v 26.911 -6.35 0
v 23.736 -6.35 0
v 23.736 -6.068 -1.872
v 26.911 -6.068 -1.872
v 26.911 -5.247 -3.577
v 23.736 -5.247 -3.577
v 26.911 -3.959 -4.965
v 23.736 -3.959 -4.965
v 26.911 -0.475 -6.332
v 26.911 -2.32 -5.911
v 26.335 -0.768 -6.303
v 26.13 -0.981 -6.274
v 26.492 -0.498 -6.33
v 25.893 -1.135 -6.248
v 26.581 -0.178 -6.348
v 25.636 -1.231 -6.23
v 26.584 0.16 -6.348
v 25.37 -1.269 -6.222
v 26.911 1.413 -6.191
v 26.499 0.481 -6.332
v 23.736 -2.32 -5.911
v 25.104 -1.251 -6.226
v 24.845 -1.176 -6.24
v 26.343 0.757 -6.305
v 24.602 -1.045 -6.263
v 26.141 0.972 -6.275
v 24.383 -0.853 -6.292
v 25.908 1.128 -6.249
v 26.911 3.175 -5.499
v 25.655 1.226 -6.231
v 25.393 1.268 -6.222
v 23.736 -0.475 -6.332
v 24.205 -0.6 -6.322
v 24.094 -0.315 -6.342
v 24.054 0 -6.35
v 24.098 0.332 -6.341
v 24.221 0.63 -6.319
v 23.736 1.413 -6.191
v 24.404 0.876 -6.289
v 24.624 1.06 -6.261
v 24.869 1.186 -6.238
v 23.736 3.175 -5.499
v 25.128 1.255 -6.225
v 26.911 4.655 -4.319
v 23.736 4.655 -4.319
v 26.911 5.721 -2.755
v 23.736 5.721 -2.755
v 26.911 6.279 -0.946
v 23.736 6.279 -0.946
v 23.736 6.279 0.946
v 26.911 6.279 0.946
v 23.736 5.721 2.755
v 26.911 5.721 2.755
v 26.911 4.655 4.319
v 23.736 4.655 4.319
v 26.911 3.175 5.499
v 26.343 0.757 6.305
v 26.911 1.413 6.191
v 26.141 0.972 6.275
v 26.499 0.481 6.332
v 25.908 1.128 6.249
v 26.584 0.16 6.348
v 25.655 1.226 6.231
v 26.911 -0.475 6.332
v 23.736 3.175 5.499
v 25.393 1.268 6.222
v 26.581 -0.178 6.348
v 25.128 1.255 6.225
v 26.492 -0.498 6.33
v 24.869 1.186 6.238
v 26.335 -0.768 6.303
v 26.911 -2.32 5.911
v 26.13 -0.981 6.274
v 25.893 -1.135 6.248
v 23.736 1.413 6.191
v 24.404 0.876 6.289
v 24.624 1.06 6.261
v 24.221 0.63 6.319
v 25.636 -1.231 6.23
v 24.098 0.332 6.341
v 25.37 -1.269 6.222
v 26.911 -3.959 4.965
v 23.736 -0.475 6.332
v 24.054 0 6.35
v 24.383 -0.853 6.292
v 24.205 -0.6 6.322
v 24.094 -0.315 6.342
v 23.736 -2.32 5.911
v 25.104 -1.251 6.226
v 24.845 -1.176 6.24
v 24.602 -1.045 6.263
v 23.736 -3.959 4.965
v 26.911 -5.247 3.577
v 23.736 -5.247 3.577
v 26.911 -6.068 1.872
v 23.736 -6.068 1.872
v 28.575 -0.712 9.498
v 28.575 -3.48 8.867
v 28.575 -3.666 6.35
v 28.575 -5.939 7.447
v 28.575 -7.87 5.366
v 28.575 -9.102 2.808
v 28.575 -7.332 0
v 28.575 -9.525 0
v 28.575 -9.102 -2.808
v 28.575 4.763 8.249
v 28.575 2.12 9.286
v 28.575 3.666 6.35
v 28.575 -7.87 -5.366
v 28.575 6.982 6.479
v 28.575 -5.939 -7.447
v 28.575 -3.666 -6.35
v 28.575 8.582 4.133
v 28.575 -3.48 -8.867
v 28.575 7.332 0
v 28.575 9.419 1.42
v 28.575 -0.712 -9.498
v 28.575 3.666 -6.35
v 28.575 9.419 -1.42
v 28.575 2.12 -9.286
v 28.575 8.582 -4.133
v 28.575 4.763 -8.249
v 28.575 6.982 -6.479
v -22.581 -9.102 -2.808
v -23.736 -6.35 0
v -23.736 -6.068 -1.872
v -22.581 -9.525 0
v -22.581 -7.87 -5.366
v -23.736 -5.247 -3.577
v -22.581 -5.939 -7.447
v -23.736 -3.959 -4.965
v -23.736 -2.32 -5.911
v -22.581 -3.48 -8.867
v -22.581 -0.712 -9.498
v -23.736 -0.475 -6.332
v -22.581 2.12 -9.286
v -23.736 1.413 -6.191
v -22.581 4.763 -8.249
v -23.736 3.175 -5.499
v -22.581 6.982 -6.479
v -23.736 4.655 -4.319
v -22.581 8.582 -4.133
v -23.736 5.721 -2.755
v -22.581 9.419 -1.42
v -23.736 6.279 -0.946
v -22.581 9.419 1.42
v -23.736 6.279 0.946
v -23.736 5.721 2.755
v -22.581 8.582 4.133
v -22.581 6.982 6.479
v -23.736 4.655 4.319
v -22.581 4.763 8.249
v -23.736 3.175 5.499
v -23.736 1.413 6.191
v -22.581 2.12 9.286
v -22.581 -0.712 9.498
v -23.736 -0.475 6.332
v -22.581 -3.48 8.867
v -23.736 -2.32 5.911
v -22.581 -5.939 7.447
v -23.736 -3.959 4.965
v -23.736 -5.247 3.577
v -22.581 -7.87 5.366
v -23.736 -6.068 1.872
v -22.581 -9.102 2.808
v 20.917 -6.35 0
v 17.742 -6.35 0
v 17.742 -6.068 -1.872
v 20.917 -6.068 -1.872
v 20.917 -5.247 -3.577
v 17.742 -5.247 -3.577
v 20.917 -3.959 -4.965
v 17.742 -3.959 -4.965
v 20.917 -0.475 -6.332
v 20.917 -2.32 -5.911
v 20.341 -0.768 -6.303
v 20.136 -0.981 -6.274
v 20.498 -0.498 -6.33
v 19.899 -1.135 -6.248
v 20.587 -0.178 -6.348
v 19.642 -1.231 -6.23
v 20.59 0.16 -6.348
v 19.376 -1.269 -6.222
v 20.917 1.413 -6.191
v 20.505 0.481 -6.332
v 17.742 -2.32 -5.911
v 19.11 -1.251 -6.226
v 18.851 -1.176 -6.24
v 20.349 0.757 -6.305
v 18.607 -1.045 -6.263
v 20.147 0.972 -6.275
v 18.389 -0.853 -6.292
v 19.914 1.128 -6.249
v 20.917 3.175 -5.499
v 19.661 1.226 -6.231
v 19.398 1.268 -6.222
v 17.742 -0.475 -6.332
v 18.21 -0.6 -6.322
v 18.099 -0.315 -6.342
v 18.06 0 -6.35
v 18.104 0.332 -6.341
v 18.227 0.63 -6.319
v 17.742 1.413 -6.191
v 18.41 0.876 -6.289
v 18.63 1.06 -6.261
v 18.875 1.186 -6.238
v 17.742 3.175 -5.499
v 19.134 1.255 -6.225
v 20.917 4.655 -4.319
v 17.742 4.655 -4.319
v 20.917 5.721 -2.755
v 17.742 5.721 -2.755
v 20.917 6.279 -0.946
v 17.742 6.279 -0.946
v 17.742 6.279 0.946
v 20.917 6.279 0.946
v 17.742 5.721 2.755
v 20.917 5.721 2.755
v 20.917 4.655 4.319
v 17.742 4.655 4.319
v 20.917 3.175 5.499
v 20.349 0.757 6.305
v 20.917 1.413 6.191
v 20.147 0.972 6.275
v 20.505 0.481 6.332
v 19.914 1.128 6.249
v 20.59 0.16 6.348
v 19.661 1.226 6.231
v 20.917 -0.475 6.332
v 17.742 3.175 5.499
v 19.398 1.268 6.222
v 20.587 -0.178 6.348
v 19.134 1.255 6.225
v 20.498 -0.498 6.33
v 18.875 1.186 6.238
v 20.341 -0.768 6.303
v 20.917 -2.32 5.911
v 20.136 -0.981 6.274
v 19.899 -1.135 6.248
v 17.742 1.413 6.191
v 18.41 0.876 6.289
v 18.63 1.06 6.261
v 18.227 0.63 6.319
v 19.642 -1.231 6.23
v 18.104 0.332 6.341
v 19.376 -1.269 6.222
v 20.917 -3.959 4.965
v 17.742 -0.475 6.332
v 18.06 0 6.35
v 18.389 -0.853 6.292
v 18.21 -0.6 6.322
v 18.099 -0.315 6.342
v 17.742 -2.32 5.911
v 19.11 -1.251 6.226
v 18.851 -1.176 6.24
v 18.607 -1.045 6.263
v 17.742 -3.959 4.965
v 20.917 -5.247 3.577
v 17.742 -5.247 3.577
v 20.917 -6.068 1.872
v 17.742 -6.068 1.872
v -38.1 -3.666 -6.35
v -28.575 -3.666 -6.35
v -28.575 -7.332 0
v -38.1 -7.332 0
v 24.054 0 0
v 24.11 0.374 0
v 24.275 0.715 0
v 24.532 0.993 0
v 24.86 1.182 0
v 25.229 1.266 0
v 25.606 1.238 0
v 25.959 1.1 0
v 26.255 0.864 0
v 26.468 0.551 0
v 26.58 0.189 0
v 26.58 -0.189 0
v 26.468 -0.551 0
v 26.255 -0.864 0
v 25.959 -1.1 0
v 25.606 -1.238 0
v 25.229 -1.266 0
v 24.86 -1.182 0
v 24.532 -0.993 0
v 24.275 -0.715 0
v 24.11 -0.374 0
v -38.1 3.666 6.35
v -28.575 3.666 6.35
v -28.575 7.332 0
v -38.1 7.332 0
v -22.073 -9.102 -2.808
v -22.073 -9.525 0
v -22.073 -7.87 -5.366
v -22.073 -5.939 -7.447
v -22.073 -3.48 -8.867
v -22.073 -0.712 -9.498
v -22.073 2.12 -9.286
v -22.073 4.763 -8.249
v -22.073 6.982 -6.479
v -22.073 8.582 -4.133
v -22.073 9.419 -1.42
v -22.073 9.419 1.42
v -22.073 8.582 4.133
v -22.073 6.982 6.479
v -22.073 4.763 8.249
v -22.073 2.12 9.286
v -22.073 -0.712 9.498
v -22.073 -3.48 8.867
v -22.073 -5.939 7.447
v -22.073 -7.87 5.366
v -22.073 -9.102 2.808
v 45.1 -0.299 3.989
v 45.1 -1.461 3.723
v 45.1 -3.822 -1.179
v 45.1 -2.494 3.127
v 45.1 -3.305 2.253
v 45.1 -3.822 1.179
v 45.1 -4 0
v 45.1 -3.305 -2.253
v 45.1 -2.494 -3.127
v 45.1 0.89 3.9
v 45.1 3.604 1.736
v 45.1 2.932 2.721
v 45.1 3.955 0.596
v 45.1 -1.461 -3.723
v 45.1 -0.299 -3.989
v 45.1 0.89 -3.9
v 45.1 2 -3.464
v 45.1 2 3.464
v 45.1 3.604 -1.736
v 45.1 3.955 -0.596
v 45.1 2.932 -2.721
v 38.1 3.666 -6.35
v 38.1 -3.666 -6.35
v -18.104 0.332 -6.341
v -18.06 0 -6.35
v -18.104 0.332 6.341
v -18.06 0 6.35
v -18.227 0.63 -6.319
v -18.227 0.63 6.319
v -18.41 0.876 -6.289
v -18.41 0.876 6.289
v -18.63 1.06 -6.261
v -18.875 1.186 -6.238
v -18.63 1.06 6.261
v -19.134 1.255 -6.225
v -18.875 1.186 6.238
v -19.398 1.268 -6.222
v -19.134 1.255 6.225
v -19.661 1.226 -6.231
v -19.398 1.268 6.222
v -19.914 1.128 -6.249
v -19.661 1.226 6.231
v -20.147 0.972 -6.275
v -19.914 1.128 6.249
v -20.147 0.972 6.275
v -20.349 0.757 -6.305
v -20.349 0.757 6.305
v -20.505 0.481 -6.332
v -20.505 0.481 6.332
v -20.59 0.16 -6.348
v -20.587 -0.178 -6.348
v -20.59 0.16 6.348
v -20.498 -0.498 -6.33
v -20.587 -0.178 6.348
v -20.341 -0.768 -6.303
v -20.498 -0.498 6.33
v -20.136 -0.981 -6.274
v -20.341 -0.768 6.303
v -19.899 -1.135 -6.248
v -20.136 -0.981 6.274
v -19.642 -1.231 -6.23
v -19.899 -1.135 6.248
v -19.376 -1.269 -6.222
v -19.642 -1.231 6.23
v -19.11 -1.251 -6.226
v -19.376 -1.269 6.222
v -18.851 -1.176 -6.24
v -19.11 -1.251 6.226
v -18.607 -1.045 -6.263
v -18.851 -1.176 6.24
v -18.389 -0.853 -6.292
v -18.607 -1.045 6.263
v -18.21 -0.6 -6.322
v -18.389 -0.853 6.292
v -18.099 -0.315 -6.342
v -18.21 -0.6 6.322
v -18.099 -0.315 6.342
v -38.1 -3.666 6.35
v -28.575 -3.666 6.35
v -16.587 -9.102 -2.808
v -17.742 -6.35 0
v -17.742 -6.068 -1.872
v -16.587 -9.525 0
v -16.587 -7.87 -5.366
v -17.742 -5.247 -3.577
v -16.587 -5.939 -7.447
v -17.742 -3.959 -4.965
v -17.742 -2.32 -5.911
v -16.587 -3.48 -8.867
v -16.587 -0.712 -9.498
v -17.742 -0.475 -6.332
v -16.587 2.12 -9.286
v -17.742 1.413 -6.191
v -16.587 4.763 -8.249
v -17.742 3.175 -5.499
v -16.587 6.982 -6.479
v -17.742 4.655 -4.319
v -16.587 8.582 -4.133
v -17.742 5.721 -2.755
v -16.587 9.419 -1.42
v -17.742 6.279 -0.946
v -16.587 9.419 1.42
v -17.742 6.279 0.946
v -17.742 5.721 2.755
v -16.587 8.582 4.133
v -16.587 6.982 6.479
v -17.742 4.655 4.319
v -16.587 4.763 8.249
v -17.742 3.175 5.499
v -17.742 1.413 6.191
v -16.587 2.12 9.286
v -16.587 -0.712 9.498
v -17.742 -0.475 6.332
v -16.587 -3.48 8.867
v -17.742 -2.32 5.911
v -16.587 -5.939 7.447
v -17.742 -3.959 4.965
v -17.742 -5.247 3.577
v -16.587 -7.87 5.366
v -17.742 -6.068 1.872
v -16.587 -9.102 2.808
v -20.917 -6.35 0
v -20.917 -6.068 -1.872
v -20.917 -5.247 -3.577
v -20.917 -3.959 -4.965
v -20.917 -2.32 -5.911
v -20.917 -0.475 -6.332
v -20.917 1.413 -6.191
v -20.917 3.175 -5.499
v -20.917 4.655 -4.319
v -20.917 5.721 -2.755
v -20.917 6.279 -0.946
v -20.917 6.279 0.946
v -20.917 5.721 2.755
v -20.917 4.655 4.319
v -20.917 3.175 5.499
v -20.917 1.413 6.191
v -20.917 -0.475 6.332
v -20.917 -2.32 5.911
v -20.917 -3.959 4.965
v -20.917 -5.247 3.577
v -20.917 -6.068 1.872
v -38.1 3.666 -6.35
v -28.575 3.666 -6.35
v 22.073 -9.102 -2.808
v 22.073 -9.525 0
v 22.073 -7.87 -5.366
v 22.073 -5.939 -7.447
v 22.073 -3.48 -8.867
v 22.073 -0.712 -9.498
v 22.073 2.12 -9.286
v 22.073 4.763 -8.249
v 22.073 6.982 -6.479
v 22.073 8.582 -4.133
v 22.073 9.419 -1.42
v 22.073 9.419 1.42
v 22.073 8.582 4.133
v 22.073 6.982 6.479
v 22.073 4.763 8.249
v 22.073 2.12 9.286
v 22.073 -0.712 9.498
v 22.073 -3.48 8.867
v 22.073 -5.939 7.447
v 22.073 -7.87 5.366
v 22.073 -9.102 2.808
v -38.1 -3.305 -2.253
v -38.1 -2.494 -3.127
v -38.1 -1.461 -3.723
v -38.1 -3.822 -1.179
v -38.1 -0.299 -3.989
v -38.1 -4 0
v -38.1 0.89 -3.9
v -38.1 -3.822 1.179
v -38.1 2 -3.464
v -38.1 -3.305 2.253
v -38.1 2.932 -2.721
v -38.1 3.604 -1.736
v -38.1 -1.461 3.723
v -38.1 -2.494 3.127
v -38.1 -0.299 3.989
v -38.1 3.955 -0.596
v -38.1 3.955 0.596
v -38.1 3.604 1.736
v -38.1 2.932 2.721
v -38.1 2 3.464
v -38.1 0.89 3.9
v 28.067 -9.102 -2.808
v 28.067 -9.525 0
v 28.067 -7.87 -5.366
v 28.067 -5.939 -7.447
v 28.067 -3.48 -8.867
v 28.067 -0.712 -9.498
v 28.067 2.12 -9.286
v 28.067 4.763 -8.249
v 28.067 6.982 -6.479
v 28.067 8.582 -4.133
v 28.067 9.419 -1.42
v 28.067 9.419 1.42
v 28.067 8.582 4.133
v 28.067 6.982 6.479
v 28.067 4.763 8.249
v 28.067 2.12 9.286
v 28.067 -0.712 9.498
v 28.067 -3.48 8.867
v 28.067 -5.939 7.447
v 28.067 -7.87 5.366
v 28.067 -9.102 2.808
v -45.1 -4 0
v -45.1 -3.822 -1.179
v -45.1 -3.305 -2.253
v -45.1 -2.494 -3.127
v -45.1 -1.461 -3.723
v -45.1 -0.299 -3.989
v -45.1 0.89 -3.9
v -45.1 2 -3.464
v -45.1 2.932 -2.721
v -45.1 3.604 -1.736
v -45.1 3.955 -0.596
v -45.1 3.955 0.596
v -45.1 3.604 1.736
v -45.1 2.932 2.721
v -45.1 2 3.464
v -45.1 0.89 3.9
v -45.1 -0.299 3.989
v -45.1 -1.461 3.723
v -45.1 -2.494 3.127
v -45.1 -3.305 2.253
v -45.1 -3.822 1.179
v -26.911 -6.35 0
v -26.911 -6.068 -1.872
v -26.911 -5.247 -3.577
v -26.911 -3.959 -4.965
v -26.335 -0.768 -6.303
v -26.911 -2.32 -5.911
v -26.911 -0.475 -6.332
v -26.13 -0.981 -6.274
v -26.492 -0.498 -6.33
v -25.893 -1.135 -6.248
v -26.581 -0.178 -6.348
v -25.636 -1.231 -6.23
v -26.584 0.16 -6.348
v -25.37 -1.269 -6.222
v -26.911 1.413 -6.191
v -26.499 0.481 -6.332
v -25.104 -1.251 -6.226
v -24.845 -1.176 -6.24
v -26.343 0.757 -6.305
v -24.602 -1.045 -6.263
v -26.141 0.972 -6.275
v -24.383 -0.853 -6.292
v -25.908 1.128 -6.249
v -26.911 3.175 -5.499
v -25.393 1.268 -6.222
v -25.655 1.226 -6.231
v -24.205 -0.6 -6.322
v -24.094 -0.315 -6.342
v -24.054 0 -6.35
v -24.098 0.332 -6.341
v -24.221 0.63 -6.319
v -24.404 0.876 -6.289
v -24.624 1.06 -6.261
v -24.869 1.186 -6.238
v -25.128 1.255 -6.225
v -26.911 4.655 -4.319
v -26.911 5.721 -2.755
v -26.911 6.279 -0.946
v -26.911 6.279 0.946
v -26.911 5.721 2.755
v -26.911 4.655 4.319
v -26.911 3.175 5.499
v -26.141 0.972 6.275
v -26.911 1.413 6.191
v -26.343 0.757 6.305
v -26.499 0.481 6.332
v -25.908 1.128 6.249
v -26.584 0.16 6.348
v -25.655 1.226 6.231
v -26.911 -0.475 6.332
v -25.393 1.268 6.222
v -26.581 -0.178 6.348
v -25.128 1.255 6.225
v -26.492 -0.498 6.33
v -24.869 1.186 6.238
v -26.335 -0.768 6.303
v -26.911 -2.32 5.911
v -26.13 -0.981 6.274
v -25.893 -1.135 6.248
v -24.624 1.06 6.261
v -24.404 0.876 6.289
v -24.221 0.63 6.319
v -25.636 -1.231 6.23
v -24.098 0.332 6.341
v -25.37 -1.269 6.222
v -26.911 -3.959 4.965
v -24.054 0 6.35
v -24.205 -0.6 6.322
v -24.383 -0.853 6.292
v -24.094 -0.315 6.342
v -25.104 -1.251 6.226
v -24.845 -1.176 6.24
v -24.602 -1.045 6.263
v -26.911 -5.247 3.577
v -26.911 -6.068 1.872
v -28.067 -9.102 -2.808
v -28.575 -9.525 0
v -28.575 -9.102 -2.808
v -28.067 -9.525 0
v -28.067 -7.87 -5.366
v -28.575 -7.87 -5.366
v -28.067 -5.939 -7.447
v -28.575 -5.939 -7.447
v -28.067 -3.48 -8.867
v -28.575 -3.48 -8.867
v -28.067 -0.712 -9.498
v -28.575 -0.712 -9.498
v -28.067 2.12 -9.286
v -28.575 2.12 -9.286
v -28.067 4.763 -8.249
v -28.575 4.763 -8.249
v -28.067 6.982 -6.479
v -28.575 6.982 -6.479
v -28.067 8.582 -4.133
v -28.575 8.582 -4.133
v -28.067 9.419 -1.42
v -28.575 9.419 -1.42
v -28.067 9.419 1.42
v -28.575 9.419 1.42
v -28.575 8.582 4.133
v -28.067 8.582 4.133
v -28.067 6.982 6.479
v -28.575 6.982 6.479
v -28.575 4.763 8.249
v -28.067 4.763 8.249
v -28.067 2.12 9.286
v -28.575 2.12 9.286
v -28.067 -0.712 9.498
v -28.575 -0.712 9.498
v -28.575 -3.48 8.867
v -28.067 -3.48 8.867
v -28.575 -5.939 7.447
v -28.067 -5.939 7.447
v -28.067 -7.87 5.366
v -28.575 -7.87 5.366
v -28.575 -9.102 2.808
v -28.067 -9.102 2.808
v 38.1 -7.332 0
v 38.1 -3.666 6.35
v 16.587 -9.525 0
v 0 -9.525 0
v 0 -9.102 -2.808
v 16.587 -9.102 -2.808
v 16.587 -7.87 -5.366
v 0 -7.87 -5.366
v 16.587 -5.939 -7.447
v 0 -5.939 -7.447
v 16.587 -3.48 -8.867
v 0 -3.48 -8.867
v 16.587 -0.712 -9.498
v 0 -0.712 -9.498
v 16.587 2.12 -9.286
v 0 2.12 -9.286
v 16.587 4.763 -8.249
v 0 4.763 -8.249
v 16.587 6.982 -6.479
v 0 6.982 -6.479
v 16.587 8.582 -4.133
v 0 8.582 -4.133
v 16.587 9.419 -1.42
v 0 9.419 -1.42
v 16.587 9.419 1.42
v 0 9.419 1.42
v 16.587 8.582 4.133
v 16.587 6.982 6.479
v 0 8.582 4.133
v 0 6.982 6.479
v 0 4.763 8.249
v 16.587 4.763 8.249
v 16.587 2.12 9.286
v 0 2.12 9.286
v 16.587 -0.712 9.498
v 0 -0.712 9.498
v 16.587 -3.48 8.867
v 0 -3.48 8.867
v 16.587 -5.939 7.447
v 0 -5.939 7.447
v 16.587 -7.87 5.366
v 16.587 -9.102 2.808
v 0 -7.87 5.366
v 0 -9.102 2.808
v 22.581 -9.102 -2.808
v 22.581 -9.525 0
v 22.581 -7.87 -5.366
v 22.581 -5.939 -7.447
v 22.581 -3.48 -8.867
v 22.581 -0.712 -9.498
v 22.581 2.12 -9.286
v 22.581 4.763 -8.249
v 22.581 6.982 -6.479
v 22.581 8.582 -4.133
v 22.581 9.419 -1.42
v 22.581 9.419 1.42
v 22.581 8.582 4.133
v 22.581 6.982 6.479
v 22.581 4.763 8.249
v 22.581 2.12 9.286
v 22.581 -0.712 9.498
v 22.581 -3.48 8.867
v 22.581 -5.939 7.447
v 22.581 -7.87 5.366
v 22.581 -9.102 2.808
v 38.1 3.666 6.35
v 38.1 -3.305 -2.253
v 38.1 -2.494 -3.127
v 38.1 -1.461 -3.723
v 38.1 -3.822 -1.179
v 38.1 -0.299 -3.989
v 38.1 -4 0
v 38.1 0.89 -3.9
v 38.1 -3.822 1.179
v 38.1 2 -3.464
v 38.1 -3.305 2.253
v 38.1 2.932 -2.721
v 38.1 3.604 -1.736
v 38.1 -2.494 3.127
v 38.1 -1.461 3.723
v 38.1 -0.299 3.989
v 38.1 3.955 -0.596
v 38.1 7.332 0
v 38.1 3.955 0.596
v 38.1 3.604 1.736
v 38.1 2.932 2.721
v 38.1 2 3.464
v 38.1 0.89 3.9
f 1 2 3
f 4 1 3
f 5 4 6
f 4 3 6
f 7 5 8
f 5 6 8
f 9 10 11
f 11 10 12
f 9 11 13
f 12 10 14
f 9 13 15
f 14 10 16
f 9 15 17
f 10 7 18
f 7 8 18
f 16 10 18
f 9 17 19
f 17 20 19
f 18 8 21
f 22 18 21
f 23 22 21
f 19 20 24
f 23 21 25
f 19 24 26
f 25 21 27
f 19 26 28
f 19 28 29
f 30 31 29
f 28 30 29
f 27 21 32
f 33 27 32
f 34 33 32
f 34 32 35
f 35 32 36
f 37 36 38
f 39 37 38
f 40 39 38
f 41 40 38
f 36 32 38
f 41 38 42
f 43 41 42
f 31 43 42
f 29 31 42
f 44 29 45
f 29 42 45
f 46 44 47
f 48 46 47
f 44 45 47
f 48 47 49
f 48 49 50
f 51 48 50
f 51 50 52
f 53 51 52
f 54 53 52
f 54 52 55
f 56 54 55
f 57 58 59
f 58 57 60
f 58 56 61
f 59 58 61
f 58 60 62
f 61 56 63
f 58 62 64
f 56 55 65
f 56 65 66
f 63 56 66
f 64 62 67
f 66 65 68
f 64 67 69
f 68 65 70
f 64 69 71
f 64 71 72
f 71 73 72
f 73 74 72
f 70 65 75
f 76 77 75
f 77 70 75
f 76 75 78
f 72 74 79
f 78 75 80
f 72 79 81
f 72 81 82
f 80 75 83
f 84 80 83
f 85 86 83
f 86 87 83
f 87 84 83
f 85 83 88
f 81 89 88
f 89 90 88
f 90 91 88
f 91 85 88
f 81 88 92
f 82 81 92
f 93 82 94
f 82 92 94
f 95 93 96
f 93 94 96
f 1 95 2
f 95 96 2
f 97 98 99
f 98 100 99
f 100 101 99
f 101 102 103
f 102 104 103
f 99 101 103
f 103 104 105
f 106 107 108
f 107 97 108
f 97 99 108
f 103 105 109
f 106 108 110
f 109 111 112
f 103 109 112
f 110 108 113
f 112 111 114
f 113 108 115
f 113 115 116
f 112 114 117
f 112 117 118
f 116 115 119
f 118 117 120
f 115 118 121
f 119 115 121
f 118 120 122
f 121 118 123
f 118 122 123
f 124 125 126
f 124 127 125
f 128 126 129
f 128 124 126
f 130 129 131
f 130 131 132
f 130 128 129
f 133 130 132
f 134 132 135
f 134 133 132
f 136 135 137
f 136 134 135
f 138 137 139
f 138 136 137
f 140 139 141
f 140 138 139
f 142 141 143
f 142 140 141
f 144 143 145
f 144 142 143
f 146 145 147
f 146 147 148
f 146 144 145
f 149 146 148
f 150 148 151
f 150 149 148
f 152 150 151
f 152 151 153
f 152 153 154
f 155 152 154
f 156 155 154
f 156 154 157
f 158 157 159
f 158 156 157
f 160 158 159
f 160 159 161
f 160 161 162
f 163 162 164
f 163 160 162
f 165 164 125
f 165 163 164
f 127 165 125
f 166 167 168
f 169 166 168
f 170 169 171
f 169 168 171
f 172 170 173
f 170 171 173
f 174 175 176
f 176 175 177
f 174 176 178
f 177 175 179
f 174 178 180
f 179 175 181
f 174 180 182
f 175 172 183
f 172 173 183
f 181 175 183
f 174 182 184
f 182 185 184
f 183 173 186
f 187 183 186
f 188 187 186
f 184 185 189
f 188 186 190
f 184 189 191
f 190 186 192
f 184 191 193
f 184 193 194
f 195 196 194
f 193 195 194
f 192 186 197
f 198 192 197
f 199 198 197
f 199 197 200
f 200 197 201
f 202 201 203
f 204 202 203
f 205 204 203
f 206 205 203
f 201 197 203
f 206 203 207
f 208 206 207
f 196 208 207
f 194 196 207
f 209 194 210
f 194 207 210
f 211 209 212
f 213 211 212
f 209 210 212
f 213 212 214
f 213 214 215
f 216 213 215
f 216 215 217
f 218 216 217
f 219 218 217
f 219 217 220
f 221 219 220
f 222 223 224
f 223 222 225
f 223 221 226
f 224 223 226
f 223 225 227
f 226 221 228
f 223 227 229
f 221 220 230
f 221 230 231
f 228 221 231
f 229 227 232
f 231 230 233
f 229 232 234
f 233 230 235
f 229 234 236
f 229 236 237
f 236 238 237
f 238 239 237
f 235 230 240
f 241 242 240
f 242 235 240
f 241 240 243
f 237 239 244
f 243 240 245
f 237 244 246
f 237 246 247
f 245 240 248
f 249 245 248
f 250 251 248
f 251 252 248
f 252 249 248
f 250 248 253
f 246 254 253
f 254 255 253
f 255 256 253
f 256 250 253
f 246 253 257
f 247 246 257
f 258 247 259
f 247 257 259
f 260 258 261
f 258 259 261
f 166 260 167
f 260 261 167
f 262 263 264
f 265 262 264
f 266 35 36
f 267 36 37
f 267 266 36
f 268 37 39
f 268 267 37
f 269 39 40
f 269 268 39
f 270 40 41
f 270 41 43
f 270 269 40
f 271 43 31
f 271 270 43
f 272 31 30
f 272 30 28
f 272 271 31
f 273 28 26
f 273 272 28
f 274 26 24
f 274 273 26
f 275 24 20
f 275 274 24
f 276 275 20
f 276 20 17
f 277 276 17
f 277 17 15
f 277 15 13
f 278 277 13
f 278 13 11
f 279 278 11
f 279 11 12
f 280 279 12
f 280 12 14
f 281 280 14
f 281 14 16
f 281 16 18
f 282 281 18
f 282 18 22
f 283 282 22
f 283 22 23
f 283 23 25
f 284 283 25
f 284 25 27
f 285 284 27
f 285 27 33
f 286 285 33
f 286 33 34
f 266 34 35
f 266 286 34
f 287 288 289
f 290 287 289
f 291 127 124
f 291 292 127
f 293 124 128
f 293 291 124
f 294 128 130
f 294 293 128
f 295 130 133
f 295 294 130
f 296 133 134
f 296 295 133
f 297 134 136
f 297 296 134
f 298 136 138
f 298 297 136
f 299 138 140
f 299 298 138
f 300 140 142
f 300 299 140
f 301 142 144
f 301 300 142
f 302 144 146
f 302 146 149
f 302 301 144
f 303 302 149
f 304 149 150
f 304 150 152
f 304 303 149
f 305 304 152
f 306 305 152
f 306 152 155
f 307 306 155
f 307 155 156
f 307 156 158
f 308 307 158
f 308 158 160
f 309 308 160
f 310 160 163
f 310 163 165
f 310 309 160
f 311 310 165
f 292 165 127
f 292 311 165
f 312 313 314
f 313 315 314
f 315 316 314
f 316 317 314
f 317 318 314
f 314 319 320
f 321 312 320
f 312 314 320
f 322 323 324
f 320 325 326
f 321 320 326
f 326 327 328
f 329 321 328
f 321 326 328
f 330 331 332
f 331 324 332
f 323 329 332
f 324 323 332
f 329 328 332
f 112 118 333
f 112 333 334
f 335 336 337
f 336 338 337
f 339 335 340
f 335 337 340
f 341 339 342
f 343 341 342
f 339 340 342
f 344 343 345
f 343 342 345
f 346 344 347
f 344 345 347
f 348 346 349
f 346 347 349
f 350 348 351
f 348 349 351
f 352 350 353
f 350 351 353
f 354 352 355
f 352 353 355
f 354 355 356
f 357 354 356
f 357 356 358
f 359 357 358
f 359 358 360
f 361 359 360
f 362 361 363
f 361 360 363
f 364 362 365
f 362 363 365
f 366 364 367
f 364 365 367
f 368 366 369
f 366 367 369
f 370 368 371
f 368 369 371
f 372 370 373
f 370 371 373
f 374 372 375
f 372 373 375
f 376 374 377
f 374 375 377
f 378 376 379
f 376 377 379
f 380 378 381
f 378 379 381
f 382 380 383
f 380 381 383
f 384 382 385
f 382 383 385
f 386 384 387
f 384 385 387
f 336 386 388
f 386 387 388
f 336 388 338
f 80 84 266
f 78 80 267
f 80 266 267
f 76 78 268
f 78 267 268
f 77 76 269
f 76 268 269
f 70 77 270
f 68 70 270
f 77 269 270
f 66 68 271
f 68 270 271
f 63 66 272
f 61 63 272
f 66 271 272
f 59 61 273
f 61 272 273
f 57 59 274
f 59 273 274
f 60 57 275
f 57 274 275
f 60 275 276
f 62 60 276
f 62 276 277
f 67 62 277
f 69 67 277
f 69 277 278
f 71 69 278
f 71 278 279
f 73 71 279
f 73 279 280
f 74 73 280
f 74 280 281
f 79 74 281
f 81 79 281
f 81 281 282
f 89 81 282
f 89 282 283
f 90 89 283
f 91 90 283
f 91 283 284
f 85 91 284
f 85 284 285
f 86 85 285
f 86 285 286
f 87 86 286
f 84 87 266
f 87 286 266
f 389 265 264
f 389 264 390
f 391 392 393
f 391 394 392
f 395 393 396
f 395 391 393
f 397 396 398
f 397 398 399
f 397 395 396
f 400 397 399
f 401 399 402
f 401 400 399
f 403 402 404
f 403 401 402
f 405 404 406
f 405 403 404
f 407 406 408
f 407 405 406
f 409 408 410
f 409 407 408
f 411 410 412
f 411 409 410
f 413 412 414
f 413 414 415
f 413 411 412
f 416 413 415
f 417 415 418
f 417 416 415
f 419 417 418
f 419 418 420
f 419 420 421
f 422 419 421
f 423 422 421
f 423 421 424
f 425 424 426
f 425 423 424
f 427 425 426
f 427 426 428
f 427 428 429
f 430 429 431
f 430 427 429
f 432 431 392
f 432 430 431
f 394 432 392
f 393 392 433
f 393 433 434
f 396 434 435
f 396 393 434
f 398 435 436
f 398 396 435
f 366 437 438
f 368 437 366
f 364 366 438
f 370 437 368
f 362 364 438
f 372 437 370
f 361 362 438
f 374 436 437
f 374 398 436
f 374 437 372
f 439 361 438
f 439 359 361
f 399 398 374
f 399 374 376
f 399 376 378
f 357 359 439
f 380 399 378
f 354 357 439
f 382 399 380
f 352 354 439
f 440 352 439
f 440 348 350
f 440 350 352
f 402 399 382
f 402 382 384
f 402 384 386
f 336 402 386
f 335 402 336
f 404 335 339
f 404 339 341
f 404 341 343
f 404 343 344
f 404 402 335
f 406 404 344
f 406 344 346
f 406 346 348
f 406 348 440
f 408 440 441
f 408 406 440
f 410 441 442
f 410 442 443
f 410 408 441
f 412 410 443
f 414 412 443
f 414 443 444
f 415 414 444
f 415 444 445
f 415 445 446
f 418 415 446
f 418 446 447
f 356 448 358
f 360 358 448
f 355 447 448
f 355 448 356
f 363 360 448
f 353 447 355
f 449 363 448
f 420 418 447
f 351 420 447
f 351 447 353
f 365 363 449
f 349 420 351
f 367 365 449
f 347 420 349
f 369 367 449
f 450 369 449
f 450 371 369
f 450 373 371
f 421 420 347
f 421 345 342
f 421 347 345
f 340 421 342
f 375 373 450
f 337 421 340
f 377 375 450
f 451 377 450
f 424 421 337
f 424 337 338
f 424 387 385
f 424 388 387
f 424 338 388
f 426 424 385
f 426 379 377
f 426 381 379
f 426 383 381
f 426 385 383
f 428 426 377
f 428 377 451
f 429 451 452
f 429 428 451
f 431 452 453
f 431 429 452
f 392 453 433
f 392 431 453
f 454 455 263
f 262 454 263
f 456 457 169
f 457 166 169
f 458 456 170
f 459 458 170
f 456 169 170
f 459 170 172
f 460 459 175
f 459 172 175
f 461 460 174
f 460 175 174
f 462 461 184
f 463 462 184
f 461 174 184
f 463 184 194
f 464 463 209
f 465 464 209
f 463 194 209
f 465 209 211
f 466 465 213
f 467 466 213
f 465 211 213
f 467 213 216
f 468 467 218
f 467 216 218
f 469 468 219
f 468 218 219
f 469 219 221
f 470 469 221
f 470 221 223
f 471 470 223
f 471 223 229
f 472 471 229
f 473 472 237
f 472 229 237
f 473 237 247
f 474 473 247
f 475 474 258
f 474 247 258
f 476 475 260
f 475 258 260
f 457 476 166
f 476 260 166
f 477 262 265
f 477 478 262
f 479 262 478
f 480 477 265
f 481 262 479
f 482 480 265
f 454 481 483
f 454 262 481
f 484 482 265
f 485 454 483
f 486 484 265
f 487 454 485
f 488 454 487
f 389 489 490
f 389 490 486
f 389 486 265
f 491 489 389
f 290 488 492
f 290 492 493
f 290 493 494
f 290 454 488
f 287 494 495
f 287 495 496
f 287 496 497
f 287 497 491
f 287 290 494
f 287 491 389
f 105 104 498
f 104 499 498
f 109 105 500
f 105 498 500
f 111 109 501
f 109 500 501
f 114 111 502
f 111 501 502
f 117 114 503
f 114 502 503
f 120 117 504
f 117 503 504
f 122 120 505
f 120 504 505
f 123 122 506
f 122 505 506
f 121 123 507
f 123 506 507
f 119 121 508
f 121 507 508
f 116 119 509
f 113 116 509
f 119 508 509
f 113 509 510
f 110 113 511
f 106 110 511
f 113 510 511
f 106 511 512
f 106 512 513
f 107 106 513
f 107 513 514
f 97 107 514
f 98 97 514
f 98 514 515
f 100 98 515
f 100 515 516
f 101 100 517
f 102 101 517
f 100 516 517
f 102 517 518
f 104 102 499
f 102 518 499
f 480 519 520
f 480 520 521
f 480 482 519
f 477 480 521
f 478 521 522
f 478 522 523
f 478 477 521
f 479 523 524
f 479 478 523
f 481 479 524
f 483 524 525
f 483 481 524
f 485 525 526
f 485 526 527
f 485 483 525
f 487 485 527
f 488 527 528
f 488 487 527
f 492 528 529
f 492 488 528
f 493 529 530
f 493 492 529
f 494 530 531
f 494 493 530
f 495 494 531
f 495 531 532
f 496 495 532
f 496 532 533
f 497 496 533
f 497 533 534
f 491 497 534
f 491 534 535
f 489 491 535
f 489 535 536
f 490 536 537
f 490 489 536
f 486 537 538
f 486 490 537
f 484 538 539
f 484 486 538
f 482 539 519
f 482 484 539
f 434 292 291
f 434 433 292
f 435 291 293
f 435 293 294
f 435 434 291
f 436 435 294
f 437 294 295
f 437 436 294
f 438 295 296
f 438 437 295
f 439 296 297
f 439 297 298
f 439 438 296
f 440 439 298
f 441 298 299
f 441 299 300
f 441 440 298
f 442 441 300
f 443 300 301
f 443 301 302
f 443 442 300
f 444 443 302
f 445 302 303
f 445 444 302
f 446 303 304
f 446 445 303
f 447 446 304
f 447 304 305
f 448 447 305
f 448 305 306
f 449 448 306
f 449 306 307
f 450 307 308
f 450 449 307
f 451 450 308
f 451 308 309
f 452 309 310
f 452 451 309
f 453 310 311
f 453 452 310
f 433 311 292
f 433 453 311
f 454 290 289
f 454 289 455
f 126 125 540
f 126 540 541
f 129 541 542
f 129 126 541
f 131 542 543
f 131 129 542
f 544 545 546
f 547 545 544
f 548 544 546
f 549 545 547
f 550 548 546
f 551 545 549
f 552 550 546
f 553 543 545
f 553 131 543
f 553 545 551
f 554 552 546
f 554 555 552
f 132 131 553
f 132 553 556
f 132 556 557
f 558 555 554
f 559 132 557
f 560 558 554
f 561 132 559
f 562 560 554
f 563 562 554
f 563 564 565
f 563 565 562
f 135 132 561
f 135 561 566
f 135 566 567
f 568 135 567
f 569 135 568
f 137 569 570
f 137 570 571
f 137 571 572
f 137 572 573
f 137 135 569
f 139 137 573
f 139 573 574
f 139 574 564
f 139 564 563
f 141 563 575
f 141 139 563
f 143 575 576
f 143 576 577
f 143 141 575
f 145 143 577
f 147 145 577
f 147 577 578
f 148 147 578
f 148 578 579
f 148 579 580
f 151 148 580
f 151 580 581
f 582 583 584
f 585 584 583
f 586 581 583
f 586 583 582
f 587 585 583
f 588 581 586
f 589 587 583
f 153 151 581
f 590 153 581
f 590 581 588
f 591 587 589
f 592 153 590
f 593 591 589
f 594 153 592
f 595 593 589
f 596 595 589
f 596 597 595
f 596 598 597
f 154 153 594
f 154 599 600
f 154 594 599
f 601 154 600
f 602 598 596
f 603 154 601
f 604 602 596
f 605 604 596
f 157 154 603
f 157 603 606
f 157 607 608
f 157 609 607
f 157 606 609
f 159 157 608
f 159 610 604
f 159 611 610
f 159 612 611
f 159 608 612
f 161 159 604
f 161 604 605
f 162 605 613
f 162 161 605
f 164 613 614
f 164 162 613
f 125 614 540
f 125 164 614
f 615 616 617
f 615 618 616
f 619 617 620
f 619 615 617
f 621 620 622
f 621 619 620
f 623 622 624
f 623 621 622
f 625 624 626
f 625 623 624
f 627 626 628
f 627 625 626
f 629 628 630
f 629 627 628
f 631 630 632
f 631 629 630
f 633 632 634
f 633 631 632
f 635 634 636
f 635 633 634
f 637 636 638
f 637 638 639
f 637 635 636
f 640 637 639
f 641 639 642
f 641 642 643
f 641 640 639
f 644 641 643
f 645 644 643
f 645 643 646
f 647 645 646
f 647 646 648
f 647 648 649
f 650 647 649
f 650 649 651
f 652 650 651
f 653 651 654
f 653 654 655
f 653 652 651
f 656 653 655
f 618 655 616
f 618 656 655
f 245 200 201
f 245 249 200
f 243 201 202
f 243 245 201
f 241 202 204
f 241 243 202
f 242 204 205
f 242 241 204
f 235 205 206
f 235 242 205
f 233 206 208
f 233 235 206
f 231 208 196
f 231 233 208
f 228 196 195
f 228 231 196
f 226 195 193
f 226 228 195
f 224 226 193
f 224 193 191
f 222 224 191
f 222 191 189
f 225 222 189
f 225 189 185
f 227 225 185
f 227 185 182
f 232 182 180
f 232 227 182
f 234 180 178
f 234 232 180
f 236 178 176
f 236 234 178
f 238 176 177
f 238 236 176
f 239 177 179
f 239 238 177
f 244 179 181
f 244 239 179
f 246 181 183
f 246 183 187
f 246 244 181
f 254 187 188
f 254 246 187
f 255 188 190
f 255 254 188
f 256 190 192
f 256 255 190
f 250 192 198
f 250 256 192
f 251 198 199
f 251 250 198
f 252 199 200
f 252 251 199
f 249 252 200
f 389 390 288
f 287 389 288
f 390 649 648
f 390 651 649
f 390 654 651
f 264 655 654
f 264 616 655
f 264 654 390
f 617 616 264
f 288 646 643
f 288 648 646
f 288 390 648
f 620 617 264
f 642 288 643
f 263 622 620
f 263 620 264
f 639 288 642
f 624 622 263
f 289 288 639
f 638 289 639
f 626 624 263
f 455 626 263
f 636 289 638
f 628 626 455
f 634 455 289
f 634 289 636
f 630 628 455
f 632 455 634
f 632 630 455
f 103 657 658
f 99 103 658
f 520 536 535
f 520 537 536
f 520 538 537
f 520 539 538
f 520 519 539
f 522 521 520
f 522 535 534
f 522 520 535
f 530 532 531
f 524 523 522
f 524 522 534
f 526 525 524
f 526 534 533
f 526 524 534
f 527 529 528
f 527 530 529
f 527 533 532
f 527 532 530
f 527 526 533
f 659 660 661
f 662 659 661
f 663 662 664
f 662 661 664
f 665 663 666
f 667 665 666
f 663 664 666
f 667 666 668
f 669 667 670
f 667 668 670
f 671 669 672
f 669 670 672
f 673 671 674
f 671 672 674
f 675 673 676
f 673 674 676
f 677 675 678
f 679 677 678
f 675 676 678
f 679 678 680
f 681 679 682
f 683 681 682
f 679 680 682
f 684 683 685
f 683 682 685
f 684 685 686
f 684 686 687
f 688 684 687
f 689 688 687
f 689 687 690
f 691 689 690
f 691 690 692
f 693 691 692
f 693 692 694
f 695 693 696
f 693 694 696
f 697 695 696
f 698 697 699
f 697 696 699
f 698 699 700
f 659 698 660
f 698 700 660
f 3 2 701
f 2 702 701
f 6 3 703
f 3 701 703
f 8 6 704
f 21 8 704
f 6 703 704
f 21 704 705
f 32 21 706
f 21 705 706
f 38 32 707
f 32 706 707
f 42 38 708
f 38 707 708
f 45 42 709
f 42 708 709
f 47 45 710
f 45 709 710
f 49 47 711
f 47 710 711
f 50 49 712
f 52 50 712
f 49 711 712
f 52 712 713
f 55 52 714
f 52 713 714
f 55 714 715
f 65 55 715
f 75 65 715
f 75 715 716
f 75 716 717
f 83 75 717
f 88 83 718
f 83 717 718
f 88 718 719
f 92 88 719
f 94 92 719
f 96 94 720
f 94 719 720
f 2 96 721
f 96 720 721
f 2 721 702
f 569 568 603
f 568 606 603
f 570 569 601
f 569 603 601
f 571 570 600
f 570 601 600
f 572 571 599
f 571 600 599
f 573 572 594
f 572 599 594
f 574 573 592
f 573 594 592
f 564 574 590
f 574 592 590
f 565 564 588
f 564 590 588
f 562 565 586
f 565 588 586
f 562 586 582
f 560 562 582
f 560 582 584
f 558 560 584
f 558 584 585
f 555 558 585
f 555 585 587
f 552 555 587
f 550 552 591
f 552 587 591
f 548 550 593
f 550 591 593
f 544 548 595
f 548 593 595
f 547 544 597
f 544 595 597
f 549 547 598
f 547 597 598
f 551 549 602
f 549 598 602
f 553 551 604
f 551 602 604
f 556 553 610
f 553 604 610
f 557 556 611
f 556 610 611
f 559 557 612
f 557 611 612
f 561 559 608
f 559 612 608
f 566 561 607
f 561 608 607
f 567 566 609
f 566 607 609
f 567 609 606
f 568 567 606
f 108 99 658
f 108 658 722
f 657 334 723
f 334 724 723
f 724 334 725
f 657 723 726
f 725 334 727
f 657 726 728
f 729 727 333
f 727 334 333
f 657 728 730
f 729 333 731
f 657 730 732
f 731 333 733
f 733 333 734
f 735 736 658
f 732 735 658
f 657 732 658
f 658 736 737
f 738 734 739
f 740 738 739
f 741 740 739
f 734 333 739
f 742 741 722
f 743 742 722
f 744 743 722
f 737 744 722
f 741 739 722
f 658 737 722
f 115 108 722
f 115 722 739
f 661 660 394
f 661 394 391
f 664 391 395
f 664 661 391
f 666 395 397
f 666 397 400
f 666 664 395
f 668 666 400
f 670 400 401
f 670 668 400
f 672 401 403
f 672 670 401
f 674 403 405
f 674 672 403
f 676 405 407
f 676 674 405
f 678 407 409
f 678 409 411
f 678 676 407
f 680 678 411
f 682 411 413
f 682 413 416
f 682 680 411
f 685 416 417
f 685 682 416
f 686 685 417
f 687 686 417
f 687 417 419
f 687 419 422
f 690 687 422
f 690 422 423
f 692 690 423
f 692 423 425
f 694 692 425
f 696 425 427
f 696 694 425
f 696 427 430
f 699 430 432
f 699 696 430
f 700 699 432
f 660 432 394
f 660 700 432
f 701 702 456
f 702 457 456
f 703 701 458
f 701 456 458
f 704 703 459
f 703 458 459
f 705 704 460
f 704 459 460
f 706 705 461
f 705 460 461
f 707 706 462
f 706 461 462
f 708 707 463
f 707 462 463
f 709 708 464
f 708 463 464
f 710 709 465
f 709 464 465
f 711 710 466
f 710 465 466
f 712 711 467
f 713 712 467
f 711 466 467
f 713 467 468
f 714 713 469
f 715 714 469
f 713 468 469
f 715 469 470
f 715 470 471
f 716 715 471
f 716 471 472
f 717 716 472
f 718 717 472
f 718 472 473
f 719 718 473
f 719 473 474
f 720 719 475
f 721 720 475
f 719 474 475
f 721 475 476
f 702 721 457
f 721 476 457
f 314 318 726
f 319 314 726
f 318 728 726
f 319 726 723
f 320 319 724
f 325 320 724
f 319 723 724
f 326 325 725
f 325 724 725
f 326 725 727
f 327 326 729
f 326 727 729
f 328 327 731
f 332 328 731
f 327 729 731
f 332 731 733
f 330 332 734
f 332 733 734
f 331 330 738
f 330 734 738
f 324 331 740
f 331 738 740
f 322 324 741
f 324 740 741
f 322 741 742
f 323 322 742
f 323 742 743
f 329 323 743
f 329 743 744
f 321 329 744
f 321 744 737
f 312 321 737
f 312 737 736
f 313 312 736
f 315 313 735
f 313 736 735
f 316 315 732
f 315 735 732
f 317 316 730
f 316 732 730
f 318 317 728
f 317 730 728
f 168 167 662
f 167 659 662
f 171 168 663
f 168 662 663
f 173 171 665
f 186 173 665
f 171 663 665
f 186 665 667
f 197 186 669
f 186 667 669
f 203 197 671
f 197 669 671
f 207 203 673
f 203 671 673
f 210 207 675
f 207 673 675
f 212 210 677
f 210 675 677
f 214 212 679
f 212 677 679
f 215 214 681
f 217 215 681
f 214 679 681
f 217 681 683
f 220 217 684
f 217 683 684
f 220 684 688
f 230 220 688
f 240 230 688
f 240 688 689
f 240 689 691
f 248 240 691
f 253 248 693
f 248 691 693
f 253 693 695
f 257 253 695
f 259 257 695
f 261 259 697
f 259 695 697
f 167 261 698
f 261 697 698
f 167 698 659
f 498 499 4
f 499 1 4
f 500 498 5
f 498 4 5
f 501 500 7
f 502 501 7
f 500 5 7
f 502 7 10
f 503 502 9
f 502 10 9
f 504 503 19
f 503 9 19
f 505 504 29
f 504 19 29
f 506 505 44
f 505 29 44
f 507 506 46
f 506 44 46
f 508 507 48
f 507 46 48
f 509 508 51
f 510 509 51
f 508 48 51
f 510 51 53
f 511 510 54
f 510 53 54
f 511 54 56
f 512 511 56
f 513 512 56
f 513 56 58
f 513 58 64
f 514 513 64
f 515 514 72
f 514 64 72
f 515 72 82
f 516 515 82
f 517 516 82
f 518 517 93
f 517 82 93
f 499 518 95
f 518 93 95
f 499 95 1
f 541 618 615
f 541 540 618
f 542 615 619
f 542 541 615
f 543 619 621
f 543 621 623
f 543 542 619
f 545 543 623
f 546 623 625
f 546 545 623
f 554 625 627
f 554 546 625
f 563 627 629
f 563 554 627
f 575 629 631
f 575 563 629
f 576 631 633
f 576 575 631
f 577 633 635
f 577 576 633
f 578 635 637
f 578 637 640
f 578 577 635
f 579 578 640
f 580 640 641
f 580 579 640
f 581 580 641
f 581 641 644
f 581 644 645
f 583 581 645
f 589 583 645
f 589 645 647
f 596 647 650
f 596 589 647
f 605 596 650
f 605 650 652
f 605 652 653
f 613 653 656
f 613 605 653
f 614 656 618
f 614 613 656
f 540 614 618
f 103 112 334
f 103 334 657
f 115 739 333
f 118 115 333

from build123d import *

# Parameters (mm, degrees)
BOSS_EXTRUDE4_DEPTH = 9.525
SKETCH6_R           = 1.27
CUT_EXTRUDE1_DEPTH  = 48.068686512


with BuildPart() as part:
    # Sketch1 → Revolve1 (revolve)
    with BuildSketch(Plane.XY, mode=Mode.PRIVATE) as revolve1_sk:
        Polygon((-28.067, 9.525), (-26.911394506, 6.35), (-23.736394506, 6.35), (-22.580789012, 9.525), (-22.072789012, 9.525), (-20.917183519, 6.35), (-17.742183519, 6.35), (-16.586578025, 9.525), (0, 9.525), (0, 0), (-28.575, 0), (-38.1, 0), (-45.1, 0), (-45.1, 4), (-38.1, 4), (-38.1, 4.254), (-28.575, 4.254), (-28.575, 9.525), align=None)
    revolve1 = revolve(revolve1_sk.sketch.rotate(Axis((-38.1, 0, 0), (1, 0, 0)), 180), axis=Axis((-38.1, 0, 0), (1, 0, 0)))

    # Sketch4 → Boss-Extrude4 (add)
    with BuildSketch(Plane.ZY.offset(28.575)):
        Polygon((0, 7.332348419), (-6.35, 3.666174209), (-6.35, -3.666174209), (0, -7.332348419), (6.35, -3.666174209), (6.35, 3.666174209), align=None)
    boss_extrude4 = extrude(amount=BOSS_EXTRUDE4_DEPTH)

    # Sketch6 → Cut-Extrude1 (cut, symmetric)
    with BuildSketch(Plane.XY):
        with Locations((-25.323894506, 0)):
            Circle(SKETCH6_R)
        with Locations((-19.329683519, 0)):
            Circle(SKETCH6_R)
    cut_extrude1 = extrude(amount=CUT_EXTRUDE1_DEPTH, both=True, mode=Mode.SUBTRACT)

    # Mirror1: Revolve1, Boss-Extrude4, Cut-Extrude1 across plane
    add(revolve1.mirror(Plane(origin=(0, 0, 0), x_dir=(0, 0, 1), z_dir=(1, 0, 0))))
    add(boss_extrude4.mirror(Plane(origin=(0, 0, 0), x_dir=(0, 0, 1), z_dir=(1, 0, 0))))
    add(cut_extrude1.mirror(Plane(origin=(0, 0, 0), x_dir=(0, 0, 1), z_dir=(1, 0, 0))), mode=Mode.SUBTRACT)


solid = part.part
